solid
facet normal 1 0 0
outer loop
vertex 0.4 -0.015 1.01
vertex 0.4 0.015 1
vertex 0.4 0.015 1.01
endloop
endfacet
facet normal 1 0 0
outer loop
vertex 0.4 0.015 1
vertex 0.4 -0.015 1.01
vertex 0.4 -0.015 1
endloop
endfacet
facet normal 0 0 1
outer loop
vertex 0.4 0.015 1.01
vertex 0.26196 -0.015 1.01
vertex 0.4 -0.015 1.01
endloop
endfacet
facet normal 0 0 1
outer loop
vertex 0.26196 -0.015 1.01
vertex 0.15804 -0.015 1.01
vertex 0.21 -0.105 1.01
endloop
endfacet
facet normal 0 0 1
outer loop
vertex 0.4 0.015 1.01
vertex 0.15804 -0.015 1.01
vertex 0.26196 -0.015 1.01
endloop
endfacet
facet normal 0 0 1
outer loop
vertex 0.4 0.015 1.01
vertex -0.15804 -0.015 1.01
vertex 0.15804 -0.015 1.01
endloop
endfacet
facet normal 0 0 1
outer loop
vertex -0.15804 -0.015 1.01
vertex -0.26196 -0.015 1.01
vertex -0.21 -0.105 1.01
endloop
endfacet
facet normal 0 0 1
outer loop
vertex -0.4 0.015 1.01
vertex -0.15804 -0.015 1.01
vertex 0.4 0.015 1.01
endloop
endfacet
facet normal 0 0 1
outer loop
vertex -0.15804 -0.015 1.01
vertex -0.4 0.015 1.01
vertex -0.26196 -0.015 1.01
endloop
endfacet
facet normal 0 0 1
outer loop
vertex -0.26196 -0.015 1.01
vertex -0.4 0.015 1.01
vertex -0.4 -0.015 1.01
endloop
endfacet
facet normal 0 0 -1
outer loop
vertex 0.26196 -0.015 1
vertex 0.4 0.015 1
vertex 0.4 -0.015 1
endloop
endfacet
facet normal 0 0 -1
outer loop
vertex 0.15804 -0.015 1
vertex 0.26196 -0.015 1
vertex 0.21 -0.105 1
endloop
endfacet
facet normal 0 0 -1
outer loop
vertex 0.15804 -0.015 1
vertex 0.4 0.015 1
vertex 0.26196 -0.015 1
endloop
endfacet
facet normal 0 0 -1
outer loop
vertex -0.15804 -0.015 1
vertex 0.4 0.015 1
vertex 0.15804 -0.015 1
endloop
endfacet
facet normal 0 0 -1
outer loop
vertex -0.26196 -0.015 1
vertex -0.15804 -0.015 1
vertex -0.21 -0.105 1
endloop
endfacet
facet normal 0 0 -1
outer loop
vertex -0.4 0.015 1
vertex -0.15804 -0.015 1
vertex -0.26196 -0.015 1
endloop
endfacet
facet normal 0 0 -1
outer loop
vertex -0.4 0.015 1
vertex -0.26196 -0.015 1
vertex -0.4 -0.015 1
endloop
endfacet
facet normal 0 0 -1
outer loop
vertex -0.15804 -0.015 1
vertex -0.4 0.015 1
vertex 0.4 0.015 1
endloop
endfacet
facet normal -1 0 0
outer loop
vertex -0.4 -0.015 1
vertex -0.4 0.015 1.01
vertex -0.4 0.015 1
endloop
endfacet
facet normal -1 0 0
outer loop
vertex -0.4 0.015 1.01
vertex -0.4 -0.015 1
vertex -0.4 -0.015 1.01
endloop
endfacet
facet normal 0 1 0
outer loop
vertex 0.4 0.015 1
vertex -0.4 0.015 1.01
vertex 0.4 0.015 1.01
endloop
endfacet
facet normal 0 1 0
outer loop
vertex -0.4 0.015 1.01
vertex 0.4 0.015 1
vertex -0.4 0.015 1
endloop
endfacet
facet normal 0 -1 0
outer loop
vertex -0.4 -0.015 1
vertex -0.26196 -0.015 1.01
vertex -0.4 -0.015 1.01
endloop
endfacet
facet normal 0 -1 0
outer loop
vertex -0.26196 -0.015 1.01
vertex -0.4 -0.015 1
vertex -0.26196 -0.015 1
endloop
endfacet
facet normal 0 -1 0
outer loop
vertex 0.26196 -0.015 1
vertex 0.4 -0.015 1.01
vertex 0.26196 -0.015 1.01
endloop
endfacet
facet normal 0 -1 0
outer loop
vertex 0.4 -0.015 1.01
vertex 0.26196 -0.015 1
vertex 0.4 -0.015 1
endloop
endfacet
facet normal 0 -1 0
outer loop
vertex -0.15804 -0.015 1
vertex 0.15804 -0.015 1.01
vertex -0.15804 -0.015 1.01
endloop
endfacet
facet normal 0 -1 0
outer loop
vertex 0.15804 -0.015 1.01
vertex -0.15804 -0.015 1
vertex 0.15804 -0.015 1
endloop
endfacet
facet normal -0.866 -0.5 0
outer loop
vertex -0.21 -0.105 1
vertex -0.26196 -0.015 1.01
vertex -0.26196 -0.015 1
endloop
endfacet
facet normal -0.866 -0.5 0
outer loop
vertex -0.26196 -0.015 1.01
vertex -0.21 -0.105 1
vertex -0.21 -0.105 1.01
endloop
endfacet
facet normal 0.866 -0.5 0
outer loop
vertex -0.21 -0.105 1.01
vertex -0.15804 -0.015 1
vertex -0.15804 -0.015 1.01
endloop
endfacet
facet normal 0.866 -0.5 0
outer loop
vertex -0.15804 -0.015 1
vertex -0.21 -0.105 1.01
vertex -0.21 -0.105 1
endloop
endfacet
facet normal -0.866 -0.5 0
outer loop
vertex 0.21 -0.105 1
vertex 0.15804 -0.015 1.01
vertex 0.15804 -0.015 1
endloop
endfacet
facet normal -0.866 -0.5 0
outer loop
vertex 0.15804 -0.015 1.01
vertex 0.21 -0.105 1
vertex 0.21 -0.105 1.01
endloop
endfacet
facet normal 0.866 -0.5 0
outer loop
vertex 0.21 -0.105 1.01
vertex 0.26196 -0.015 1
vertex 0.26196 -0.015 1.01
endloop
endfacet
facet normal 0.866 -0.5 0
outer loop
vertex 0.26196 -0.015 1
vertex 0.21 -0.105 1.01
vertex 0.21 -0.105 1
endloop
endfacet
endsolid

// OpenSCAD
use <lib.scad>

module baseHD() {
	difference() {
		minkowskiOutsideRound(10,$fn=8)
		translate([0,0,1000-50]) box([1000, 1000, 150]);
		translate([-225,0,1000]) box([425, 1100, 100]);
		translate([225,0,1000]) box([425, 1100, 100]);
	}
}

module baseLD() {
	difference() {
		translate([0,0,1000-50]) box([1000, 1000, 150]);
		translate([-225,0,1000]) box([425, 1100, 100]);
		translate([225,0,1000]) box([425, 1100, 100]);
	}
}

module pillar() {
	translate([0,0,450]) box([500, 500, 900]);
}

module belt() {
	translate([0,0,995]) box([850, 1000, 10]);
}

module beltVLD() {
	translate([0,0,995]) box([850, 1000, 50]);
}

module ridge() {
	translate([0,0,1.005]) union() {
		box([0.800, 0.030, 0.010]);
		translate([-0.21,-0.03,0]) rotate([0,0,30]) cyl(0.075,0.075,0.010,$fn=3);
		translate([0.21,-0.03,0]) rotate([0,0,30]) cyl(0.075,0.075,0.010,$fn=3);
	}
}

module baseRightHD($fn=64) {
	translate([0,0,1000-50]) union() {
		translate([500,-500,0]) intersection() {
			cyl(50, 50, 100);
			#translate([-25,25,0]) box([50, 50, 100]);
		}
		translate([500,-500,0]) difference() {
			minkowskiOutsideRound(10,$fn=8)
			intersection() {
				cyl(1000, 1000, 150,$fn=64);
				translate([-500,500,0]) box([1000, 1000, 200]);
			}
			translate([0,0,50]) difference() {
				cyl(937, 937, 100);
				cyl(513, 513, 110);
			}
			translate([0,0,50]) difference() {
				cyl(487, 487, 100);
				cyl(63, 63, 110);
			}
		}
	}
}

module baseRightLD($fn=24) {
	translate([0,0,1000-50]) union() {
		translate([500,-500,0]) intersection() {
			cyl(50, 50, 100);
			translate([-25,25,0]) box([50, 50, 100]);
		}
		translate([500,-500,0]) difference() {
//			minkowskiOutsideRound(10,$fn=8)
			intersection() {
				cyl(1000, 1000, 150,$fn=24);
				translate([-500,500,0]) box([1000, 1000, 200]);
			}
			translate([0,0,50]) difference() {
				cyl(937, 937, 100);
				cyl(513, 513, 110);
			}
			translate([0,0,50]) difference() {
				cyl(487, 487, 100);
				cyl(63, 63, 110);
			}
		}
	}
}

module baseLeftHD() {
	mirror([1,0,0]) baseRightHD();
}

module baseLeftLD() {
	mirror([1,0,0]) baseRightLD();
}

module beltRight(s=1) {
	translate([0,0,995]) scale([1,1,s]) intersection() {
		translate([500,-500,0]) difference() {
			cyl(925, 925, 10);
			cyl( 75,  75, 20);
		}
		box([1000, 1000, 200]);
	}
}

module beltLeft(s=1) {
	mirror([1,0,0]) beltRight(s);
}

module unveyor() {
	translate([0,0,1000]) difference() {
		box([1000,2000,1500]);
		translate([0,501,0]) box([900,1001,1400]);
		translate([0,-1800,0]) rotate([-36.5,0,0]) box([2000,2000,5000]);
		translate([0,2000,0]) rotate([10,0,0]) box([2000,2000,2000]);
	}
}

module loader() {
	translate([0,0,750]) difference() {
		box([1000,2000,1500]);
		translate([0,501,0]) box([900,1001,1400]);
		translate([0,2000,0]) rotate([10,0,0]) box([2000,2000,2000]);
	}
}

module balancer() {
	difference() {
		translate([0,0,1200]) box([1000, 1000, 600]);
		translate([0,0,1200]) box([900, 1100, 500]);
	}
}

//baseHD();
//baseLD();

//fillet(10,$fn=8) loader();
//loader();

//fillet(10,$fn=8) pillar();
//pillar();

//beltVLD();
ridge();

//baseRightHD();
//baseRightLD();
//baseLeftHD();
//baseLeftLD();

//beltLeft($fn=64);
//beltLeft($fn=24);

//beltRight($fn=64);
//beltRight($fn=24);

//fillet(10,$fn=8) unveyor();
//unveyor();

//fillet(10,$fn=8) balancer();
//balancer();
